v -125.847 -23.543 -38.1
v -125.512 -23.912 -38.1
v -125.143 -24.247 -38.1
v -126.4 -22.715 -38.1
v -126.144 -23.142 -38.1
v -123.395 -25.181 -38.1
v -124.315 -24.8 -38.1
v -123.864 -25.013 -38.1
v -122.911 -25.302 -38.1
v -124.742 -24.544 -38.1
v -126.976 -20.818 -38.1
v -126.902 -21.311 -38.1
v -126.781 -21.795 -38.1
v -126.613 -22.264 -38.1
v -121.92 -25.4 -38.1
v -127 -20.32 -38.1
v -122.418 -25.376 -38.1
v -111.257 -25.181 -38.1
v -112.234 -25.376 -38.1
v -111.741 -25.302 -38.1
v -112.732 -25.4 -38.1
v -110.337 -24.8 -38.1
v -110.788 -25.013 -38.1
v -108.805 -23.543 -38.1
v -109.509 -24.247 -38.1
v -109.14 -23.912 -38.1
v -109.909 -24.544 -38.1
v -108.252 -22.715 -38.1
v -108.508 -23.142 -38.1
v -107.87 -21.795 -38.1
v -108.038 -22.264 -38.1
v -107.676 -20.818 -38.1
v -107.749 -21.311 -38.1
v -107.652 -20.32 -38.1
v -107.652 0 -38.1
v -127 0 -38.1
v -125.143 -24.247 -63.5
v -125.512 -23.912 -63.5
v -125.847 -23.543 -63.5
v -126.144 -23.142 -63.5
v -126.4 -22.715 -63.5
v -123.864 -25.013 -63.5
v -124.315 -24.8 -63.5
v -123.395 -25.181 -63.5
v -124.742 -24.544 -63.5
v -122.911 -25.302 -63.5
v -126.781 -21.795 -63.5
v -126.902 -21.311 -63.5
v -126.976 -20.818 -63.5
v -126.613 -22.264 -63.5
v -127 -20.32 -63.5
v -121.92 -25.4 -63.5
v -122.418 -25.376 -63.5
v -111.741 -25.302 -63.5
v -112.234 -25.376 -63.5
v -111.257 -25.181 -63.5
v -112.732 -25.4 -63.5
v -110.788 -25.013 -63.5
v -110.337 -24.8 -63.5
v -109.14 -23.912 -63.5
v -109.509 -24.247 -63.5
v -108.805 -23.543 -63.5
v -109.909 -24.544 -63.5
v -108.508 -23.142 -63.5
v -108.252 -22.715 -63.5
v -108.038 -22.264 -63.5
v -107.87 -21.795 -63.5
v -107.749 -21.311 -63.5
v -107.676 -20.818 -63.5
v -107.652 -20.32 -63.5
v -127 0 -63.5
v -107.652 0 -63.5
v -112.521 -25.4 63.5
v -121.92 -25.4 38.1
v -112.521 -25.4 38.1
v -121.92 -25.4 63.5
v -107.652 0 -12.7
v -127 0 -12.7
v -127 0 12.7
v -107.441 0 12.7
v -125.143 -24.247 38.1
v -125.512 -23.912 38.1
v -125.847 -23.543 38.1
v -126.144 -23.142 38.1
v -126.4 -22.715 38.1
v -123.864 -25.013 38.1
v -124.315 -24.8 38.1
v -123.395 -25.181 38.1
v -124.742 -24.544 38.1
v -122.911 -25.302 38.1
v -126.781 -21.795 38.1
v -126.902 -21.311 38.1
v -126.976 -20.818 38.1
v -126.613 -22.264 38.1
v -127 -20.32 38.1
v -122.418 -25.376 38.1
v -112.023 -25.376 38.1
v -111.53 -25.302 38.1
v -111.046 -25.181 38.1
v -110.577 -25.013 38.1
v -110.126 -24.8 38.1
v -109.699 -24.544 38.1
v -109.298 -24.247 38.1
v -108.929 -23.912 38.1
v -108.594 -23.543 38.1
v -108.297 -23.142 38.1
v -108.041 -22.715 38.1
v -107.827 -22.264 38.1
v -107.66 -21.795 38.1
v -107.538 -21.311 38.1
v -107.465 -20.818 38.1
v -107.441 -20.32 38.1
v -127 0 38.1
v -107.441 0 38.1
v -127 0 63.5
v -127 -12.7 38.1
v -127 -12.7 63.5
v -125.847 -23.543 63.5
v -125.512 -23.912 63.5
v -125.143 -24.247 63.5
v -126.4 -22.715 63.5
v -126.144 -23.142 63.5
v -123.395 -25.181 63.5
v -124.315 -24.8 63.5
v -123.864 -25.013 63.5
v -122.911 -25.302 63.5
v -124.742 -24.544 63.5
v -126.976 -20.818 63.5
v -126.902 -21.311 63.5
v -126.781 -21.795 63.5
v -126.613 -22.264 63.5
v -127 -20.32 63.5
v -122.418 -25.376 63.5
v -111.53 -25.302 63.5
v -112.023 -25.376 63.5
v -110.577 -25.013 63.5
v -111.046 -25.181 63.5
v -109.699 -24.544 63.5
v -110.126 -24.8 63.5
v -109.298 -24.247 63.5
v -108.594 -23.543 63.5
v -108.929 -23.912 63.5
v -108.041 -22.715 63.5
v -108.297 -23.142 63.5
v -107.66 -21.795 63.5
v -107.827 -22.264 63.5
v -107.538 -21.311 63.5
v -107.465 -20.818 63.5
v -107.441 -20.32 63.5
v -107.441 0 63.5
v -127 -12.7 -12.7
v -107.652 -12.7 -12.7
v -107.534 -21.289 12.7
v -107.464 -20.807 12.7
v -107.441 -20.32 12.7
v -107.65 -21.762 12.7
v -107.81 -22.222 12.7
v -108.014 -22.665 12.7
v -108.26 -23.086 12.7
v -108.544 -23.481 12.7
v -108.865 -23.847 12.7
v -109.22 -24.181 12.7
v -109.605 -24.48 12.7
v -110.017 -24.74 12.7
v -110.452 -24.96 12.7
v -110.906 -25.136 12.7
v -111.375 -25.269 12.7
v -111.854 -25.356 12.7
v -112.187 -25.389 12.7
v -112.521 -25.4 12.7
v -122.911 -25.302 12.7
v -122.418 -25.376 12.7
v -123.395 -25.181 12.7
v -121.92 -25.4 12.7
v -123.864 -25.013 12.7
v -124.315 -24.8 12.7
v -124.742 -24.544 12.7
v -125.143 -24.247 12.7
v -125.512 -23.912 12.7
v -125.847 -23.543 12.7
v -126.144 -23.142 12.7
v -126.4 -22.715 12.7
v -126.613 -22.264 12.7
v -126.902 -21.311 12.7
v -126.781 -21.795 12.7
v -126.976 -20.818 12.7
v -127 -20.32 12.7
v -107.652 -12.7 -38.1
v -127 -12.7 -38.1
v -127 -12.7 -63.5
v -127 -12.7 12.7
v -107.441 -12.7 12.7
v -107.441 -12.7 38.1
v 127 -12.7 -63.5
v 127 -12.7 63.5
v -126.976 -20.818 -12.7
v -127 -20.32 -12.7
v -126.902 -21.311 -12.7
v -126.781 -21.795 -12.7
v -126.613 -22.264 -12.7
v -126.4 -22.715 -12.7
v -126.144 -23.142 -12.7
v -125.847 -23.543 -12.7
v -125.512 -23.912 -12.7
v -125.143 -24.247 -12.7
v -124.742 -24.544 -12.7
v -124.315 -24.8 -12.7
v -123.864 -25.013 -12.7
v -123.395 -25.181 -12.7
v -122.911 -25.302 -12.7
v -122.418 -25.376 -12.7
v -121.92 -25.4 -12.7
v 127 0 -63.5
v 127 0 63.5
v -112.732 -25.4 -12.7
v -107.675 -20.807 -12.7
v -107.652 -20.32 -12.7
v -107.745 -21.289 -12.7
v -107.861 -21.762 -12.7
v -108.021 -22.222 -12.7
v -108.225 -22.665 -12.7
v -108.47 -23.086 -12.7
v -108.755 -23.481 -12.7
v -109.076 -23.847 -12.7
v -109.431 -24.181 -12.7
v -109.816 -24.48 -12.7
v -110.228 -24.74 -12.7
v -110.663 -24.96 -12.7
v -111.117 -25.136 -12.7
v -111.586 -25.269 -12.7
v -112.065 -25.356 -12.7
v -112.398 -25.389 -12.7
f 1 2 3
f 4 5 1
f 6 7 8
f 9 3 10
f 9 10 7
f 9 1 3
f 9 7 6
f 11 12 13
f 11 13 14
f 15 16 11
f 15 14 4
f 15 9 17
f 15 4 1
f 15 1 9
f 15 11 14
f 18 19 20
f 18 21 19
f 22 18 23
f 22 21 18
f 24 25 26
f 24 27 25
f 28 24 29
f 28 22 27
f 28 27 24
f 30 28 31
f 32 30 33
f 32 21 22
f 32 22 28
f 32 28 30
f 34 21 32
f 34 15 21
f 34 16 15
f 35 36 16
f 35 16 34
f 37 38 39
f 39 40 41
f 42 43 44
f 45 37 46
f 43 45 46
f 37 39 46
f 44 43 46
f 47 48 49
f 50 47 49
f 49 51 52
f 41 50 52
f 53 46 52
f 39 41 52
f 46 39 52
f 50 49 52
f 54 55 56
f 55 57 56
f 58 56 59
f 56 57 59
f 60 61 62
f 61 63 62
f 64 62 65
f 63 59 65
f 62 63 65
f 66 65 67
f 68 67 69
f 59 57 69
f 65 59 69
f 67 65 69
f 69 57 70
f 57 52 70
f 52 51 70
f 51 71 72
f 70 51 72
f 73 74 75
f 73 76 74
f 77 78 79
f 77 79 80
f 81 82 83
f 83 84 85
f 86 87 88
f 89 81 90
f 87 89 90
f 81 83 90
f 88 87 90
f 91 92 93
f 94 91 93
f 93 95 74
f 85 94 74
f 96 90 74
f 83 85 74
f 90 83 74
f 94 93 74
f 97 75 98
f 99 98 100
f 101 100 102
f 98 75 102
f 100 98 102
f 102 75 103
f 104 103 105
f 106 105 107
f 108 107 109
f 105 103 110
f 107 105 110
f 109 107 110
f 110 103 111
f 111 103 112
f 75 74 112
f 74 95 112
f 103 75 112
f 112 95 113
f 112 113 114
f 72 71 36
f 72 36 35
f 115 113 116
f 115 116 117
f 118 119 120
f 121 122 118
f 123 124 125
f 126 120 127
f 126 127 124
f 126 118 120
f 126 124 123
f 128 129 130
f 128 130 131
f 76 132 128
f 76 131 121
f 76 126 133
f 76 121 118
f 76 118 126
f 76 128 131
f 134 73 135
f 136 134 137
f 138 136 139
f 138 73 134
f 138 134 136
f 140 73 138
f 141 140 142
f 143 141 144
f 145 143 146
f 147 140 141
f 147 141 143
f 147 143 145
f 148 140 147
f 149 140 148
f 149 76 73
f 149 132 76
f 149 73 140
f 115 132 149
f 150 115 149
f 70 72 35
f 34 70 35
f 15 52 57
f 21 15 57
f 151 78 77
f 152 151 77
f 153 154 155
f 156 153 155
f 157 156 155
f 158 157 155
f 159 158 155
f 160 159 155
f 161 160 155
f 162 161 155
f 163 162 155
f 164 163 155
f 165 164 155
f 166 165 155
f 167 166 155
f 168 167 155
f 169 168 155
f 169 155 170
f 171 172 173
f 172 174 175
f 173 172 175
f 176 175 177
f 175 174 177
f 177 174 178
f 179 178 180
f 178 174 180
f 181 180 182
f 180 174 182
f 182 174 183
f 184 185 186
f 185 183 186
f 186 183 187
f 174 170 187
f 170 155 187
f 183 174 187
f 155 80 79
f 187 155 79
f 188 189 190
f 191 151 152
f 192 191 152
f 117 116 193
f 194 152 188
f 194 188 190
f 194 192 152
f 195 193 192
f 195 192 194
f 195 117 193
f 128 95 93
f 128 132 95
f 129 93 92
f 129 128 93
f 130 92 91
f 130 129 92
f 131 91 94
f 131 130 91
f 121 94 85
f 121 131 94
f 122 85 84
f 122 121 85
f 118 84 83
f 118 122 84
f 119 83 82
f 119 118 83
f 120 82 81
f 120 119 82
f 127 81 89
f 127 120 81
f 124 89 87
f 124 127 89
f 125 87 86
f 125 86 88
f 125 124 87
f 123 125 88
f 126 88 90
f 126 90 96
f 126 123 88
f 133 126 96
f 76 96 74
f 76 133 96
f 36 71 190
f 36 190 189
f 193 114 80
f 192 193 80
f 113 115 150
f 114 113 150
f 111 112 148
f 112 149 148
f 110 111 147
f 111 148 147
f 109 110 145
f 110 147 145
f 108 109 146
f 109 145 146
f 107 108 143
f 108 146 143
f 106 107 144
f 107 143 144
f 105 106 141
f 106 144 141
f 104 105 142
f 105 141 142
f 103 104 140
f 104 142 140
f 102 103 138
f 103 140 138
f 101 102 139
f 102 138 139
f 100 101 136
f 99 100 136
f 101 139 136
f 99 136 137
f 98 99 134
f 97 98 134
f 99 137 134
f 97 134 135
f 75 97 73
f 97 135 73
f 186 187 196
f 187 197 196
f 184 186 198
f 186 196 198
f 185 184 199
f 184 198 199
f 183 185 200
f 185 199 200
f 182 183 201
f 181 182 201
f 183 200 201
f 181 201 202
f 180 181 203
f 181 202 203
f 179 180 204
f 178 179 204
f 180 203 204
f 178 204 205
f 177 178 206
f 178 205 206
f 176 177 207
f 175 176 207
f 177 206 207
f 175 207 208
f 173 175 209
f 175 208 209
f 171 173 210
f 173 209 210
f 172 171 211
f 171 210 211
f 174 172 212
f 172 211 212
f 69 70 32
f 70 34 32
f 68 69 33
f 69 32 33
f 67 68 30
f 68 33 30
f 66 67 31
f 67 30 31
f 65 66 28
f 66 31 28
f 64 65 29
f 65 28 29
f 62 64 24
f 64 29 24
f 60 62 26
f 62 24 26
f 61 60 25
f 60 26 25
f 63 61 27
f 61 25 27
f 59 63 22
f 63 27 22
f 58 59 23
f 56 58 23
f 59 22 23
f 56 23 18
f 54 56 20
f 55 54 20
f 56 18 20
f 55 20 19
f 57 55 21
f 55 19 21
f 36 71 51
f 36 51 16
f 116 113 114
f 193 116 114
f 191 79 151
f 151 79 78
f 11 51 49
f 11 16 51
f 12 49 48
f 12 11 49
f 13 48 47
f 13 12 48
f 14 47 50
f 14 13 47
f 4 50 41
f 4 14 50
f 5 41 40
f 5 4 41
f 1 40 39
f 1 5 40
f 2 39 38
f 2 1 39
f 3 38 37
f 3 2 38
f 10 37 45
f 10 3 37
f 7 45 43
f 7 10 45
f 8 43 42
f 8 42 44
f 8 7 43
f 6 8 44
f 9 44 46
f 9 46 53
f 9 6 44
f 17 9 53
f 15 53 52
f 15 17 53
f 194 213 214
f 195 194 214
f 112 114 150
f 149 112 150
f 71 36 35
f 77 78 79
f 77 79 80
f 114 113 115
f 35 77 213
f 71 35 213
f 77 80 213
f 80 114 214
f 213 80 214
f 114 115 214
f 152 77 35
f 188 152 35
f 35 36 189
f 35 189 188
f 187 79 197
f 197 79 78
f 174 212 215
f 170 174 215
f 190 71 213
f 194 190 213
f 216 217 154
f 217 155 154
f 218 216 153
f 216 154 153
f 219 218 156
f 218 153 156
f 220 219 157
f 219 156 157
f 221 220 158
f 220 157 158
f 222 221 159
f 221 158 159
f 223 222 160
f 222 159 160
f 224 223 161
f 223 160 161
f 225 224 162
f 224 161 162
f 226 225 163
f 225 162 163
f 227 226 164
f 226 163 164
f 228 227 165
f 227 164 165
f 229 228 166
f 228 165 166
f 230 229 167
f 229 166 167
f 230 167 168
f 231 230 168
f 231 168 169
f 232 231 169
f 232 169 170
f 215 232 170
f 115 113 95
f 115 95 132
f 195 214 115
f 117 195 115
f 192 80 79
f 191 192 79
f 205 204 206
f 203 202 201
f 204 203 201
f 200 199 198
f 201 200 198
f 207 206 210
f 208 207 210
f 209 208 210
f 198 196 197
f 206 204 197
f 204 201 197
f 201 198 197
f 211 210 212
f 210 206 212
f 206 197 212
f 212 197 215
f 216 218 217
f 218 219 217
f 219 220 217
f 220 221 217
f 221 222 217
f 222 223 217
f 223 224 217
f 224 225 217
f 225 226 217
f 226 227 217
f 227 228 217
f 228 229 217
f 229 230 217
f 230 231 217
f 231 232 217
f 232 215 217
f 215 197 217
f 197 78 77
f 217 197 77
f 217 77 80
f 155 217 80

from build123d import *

# Parameters (mm, degrees)
F0_W     = 19.559201
F0_H     = 25.4
F0_W_2   = 19.348304
F1_DEPTH = 25.4
F2_DEPTH = 12.7
F3_R     = 5.08


with BuildPart() as f1:
    # F0 (on Front) → F1 (new body)
    with BuildSketch(Plane.XZ):
        with Locations((-117.220399, 50.8)):
            Rectangle(F0_W, F0_H)
        Polygon((-107.651696, -12.7), (-107.440799, 12.7), (-127, 12.7), (-127, -12.7), align=None)
        with Locations((-117.325848, -50.8)):
            Rectangle(F0_W_2, F0_H)
    extrude(amount=F1_DEPTH)

    # F3
    f3_edges = [f1.edges().sort_by_distance(p)[0] for p in [
        (-107.440799, -25.4, 50.8),
        (-107.546248, -25.4, 0),
        (-107.651696, -25.4, -50.8),
        (-127, -25.4, -50.8),
        (-127, -25.4, 0),
        (-127, -25.4, 50.8),
    ]]
    fillet(f3_edges, radius=F3_R)


with BuildPart() as f2:
    # F0 (on Front) → F2 (new body)
    with BuildSketch(Plane.XZ):
        with Locations((-117.220399, 50.8)):
            Rectangle(F0_W, F0_H)
        Polygon((127, 63.5), (-107.440799, 63.5), (-107.440799, 38.1), (-107.440799, 12.7), (-107.651696, -12.7), (-107.651696, -38.1), (-107.651696, -63.5), (127, -63.5), align=None)
        Polygon((-107.651696, -12.7), (-107.440799, 12.7), (-127, 12.7), (-127, -12.7), align=None)
        with Locations((-117.325848, -50.8)):
            Rectangle(F0_W_2, F0_H)
    extrude(amount=F2_DEPTH)


solid = Compound([f1.part, f2.part])
